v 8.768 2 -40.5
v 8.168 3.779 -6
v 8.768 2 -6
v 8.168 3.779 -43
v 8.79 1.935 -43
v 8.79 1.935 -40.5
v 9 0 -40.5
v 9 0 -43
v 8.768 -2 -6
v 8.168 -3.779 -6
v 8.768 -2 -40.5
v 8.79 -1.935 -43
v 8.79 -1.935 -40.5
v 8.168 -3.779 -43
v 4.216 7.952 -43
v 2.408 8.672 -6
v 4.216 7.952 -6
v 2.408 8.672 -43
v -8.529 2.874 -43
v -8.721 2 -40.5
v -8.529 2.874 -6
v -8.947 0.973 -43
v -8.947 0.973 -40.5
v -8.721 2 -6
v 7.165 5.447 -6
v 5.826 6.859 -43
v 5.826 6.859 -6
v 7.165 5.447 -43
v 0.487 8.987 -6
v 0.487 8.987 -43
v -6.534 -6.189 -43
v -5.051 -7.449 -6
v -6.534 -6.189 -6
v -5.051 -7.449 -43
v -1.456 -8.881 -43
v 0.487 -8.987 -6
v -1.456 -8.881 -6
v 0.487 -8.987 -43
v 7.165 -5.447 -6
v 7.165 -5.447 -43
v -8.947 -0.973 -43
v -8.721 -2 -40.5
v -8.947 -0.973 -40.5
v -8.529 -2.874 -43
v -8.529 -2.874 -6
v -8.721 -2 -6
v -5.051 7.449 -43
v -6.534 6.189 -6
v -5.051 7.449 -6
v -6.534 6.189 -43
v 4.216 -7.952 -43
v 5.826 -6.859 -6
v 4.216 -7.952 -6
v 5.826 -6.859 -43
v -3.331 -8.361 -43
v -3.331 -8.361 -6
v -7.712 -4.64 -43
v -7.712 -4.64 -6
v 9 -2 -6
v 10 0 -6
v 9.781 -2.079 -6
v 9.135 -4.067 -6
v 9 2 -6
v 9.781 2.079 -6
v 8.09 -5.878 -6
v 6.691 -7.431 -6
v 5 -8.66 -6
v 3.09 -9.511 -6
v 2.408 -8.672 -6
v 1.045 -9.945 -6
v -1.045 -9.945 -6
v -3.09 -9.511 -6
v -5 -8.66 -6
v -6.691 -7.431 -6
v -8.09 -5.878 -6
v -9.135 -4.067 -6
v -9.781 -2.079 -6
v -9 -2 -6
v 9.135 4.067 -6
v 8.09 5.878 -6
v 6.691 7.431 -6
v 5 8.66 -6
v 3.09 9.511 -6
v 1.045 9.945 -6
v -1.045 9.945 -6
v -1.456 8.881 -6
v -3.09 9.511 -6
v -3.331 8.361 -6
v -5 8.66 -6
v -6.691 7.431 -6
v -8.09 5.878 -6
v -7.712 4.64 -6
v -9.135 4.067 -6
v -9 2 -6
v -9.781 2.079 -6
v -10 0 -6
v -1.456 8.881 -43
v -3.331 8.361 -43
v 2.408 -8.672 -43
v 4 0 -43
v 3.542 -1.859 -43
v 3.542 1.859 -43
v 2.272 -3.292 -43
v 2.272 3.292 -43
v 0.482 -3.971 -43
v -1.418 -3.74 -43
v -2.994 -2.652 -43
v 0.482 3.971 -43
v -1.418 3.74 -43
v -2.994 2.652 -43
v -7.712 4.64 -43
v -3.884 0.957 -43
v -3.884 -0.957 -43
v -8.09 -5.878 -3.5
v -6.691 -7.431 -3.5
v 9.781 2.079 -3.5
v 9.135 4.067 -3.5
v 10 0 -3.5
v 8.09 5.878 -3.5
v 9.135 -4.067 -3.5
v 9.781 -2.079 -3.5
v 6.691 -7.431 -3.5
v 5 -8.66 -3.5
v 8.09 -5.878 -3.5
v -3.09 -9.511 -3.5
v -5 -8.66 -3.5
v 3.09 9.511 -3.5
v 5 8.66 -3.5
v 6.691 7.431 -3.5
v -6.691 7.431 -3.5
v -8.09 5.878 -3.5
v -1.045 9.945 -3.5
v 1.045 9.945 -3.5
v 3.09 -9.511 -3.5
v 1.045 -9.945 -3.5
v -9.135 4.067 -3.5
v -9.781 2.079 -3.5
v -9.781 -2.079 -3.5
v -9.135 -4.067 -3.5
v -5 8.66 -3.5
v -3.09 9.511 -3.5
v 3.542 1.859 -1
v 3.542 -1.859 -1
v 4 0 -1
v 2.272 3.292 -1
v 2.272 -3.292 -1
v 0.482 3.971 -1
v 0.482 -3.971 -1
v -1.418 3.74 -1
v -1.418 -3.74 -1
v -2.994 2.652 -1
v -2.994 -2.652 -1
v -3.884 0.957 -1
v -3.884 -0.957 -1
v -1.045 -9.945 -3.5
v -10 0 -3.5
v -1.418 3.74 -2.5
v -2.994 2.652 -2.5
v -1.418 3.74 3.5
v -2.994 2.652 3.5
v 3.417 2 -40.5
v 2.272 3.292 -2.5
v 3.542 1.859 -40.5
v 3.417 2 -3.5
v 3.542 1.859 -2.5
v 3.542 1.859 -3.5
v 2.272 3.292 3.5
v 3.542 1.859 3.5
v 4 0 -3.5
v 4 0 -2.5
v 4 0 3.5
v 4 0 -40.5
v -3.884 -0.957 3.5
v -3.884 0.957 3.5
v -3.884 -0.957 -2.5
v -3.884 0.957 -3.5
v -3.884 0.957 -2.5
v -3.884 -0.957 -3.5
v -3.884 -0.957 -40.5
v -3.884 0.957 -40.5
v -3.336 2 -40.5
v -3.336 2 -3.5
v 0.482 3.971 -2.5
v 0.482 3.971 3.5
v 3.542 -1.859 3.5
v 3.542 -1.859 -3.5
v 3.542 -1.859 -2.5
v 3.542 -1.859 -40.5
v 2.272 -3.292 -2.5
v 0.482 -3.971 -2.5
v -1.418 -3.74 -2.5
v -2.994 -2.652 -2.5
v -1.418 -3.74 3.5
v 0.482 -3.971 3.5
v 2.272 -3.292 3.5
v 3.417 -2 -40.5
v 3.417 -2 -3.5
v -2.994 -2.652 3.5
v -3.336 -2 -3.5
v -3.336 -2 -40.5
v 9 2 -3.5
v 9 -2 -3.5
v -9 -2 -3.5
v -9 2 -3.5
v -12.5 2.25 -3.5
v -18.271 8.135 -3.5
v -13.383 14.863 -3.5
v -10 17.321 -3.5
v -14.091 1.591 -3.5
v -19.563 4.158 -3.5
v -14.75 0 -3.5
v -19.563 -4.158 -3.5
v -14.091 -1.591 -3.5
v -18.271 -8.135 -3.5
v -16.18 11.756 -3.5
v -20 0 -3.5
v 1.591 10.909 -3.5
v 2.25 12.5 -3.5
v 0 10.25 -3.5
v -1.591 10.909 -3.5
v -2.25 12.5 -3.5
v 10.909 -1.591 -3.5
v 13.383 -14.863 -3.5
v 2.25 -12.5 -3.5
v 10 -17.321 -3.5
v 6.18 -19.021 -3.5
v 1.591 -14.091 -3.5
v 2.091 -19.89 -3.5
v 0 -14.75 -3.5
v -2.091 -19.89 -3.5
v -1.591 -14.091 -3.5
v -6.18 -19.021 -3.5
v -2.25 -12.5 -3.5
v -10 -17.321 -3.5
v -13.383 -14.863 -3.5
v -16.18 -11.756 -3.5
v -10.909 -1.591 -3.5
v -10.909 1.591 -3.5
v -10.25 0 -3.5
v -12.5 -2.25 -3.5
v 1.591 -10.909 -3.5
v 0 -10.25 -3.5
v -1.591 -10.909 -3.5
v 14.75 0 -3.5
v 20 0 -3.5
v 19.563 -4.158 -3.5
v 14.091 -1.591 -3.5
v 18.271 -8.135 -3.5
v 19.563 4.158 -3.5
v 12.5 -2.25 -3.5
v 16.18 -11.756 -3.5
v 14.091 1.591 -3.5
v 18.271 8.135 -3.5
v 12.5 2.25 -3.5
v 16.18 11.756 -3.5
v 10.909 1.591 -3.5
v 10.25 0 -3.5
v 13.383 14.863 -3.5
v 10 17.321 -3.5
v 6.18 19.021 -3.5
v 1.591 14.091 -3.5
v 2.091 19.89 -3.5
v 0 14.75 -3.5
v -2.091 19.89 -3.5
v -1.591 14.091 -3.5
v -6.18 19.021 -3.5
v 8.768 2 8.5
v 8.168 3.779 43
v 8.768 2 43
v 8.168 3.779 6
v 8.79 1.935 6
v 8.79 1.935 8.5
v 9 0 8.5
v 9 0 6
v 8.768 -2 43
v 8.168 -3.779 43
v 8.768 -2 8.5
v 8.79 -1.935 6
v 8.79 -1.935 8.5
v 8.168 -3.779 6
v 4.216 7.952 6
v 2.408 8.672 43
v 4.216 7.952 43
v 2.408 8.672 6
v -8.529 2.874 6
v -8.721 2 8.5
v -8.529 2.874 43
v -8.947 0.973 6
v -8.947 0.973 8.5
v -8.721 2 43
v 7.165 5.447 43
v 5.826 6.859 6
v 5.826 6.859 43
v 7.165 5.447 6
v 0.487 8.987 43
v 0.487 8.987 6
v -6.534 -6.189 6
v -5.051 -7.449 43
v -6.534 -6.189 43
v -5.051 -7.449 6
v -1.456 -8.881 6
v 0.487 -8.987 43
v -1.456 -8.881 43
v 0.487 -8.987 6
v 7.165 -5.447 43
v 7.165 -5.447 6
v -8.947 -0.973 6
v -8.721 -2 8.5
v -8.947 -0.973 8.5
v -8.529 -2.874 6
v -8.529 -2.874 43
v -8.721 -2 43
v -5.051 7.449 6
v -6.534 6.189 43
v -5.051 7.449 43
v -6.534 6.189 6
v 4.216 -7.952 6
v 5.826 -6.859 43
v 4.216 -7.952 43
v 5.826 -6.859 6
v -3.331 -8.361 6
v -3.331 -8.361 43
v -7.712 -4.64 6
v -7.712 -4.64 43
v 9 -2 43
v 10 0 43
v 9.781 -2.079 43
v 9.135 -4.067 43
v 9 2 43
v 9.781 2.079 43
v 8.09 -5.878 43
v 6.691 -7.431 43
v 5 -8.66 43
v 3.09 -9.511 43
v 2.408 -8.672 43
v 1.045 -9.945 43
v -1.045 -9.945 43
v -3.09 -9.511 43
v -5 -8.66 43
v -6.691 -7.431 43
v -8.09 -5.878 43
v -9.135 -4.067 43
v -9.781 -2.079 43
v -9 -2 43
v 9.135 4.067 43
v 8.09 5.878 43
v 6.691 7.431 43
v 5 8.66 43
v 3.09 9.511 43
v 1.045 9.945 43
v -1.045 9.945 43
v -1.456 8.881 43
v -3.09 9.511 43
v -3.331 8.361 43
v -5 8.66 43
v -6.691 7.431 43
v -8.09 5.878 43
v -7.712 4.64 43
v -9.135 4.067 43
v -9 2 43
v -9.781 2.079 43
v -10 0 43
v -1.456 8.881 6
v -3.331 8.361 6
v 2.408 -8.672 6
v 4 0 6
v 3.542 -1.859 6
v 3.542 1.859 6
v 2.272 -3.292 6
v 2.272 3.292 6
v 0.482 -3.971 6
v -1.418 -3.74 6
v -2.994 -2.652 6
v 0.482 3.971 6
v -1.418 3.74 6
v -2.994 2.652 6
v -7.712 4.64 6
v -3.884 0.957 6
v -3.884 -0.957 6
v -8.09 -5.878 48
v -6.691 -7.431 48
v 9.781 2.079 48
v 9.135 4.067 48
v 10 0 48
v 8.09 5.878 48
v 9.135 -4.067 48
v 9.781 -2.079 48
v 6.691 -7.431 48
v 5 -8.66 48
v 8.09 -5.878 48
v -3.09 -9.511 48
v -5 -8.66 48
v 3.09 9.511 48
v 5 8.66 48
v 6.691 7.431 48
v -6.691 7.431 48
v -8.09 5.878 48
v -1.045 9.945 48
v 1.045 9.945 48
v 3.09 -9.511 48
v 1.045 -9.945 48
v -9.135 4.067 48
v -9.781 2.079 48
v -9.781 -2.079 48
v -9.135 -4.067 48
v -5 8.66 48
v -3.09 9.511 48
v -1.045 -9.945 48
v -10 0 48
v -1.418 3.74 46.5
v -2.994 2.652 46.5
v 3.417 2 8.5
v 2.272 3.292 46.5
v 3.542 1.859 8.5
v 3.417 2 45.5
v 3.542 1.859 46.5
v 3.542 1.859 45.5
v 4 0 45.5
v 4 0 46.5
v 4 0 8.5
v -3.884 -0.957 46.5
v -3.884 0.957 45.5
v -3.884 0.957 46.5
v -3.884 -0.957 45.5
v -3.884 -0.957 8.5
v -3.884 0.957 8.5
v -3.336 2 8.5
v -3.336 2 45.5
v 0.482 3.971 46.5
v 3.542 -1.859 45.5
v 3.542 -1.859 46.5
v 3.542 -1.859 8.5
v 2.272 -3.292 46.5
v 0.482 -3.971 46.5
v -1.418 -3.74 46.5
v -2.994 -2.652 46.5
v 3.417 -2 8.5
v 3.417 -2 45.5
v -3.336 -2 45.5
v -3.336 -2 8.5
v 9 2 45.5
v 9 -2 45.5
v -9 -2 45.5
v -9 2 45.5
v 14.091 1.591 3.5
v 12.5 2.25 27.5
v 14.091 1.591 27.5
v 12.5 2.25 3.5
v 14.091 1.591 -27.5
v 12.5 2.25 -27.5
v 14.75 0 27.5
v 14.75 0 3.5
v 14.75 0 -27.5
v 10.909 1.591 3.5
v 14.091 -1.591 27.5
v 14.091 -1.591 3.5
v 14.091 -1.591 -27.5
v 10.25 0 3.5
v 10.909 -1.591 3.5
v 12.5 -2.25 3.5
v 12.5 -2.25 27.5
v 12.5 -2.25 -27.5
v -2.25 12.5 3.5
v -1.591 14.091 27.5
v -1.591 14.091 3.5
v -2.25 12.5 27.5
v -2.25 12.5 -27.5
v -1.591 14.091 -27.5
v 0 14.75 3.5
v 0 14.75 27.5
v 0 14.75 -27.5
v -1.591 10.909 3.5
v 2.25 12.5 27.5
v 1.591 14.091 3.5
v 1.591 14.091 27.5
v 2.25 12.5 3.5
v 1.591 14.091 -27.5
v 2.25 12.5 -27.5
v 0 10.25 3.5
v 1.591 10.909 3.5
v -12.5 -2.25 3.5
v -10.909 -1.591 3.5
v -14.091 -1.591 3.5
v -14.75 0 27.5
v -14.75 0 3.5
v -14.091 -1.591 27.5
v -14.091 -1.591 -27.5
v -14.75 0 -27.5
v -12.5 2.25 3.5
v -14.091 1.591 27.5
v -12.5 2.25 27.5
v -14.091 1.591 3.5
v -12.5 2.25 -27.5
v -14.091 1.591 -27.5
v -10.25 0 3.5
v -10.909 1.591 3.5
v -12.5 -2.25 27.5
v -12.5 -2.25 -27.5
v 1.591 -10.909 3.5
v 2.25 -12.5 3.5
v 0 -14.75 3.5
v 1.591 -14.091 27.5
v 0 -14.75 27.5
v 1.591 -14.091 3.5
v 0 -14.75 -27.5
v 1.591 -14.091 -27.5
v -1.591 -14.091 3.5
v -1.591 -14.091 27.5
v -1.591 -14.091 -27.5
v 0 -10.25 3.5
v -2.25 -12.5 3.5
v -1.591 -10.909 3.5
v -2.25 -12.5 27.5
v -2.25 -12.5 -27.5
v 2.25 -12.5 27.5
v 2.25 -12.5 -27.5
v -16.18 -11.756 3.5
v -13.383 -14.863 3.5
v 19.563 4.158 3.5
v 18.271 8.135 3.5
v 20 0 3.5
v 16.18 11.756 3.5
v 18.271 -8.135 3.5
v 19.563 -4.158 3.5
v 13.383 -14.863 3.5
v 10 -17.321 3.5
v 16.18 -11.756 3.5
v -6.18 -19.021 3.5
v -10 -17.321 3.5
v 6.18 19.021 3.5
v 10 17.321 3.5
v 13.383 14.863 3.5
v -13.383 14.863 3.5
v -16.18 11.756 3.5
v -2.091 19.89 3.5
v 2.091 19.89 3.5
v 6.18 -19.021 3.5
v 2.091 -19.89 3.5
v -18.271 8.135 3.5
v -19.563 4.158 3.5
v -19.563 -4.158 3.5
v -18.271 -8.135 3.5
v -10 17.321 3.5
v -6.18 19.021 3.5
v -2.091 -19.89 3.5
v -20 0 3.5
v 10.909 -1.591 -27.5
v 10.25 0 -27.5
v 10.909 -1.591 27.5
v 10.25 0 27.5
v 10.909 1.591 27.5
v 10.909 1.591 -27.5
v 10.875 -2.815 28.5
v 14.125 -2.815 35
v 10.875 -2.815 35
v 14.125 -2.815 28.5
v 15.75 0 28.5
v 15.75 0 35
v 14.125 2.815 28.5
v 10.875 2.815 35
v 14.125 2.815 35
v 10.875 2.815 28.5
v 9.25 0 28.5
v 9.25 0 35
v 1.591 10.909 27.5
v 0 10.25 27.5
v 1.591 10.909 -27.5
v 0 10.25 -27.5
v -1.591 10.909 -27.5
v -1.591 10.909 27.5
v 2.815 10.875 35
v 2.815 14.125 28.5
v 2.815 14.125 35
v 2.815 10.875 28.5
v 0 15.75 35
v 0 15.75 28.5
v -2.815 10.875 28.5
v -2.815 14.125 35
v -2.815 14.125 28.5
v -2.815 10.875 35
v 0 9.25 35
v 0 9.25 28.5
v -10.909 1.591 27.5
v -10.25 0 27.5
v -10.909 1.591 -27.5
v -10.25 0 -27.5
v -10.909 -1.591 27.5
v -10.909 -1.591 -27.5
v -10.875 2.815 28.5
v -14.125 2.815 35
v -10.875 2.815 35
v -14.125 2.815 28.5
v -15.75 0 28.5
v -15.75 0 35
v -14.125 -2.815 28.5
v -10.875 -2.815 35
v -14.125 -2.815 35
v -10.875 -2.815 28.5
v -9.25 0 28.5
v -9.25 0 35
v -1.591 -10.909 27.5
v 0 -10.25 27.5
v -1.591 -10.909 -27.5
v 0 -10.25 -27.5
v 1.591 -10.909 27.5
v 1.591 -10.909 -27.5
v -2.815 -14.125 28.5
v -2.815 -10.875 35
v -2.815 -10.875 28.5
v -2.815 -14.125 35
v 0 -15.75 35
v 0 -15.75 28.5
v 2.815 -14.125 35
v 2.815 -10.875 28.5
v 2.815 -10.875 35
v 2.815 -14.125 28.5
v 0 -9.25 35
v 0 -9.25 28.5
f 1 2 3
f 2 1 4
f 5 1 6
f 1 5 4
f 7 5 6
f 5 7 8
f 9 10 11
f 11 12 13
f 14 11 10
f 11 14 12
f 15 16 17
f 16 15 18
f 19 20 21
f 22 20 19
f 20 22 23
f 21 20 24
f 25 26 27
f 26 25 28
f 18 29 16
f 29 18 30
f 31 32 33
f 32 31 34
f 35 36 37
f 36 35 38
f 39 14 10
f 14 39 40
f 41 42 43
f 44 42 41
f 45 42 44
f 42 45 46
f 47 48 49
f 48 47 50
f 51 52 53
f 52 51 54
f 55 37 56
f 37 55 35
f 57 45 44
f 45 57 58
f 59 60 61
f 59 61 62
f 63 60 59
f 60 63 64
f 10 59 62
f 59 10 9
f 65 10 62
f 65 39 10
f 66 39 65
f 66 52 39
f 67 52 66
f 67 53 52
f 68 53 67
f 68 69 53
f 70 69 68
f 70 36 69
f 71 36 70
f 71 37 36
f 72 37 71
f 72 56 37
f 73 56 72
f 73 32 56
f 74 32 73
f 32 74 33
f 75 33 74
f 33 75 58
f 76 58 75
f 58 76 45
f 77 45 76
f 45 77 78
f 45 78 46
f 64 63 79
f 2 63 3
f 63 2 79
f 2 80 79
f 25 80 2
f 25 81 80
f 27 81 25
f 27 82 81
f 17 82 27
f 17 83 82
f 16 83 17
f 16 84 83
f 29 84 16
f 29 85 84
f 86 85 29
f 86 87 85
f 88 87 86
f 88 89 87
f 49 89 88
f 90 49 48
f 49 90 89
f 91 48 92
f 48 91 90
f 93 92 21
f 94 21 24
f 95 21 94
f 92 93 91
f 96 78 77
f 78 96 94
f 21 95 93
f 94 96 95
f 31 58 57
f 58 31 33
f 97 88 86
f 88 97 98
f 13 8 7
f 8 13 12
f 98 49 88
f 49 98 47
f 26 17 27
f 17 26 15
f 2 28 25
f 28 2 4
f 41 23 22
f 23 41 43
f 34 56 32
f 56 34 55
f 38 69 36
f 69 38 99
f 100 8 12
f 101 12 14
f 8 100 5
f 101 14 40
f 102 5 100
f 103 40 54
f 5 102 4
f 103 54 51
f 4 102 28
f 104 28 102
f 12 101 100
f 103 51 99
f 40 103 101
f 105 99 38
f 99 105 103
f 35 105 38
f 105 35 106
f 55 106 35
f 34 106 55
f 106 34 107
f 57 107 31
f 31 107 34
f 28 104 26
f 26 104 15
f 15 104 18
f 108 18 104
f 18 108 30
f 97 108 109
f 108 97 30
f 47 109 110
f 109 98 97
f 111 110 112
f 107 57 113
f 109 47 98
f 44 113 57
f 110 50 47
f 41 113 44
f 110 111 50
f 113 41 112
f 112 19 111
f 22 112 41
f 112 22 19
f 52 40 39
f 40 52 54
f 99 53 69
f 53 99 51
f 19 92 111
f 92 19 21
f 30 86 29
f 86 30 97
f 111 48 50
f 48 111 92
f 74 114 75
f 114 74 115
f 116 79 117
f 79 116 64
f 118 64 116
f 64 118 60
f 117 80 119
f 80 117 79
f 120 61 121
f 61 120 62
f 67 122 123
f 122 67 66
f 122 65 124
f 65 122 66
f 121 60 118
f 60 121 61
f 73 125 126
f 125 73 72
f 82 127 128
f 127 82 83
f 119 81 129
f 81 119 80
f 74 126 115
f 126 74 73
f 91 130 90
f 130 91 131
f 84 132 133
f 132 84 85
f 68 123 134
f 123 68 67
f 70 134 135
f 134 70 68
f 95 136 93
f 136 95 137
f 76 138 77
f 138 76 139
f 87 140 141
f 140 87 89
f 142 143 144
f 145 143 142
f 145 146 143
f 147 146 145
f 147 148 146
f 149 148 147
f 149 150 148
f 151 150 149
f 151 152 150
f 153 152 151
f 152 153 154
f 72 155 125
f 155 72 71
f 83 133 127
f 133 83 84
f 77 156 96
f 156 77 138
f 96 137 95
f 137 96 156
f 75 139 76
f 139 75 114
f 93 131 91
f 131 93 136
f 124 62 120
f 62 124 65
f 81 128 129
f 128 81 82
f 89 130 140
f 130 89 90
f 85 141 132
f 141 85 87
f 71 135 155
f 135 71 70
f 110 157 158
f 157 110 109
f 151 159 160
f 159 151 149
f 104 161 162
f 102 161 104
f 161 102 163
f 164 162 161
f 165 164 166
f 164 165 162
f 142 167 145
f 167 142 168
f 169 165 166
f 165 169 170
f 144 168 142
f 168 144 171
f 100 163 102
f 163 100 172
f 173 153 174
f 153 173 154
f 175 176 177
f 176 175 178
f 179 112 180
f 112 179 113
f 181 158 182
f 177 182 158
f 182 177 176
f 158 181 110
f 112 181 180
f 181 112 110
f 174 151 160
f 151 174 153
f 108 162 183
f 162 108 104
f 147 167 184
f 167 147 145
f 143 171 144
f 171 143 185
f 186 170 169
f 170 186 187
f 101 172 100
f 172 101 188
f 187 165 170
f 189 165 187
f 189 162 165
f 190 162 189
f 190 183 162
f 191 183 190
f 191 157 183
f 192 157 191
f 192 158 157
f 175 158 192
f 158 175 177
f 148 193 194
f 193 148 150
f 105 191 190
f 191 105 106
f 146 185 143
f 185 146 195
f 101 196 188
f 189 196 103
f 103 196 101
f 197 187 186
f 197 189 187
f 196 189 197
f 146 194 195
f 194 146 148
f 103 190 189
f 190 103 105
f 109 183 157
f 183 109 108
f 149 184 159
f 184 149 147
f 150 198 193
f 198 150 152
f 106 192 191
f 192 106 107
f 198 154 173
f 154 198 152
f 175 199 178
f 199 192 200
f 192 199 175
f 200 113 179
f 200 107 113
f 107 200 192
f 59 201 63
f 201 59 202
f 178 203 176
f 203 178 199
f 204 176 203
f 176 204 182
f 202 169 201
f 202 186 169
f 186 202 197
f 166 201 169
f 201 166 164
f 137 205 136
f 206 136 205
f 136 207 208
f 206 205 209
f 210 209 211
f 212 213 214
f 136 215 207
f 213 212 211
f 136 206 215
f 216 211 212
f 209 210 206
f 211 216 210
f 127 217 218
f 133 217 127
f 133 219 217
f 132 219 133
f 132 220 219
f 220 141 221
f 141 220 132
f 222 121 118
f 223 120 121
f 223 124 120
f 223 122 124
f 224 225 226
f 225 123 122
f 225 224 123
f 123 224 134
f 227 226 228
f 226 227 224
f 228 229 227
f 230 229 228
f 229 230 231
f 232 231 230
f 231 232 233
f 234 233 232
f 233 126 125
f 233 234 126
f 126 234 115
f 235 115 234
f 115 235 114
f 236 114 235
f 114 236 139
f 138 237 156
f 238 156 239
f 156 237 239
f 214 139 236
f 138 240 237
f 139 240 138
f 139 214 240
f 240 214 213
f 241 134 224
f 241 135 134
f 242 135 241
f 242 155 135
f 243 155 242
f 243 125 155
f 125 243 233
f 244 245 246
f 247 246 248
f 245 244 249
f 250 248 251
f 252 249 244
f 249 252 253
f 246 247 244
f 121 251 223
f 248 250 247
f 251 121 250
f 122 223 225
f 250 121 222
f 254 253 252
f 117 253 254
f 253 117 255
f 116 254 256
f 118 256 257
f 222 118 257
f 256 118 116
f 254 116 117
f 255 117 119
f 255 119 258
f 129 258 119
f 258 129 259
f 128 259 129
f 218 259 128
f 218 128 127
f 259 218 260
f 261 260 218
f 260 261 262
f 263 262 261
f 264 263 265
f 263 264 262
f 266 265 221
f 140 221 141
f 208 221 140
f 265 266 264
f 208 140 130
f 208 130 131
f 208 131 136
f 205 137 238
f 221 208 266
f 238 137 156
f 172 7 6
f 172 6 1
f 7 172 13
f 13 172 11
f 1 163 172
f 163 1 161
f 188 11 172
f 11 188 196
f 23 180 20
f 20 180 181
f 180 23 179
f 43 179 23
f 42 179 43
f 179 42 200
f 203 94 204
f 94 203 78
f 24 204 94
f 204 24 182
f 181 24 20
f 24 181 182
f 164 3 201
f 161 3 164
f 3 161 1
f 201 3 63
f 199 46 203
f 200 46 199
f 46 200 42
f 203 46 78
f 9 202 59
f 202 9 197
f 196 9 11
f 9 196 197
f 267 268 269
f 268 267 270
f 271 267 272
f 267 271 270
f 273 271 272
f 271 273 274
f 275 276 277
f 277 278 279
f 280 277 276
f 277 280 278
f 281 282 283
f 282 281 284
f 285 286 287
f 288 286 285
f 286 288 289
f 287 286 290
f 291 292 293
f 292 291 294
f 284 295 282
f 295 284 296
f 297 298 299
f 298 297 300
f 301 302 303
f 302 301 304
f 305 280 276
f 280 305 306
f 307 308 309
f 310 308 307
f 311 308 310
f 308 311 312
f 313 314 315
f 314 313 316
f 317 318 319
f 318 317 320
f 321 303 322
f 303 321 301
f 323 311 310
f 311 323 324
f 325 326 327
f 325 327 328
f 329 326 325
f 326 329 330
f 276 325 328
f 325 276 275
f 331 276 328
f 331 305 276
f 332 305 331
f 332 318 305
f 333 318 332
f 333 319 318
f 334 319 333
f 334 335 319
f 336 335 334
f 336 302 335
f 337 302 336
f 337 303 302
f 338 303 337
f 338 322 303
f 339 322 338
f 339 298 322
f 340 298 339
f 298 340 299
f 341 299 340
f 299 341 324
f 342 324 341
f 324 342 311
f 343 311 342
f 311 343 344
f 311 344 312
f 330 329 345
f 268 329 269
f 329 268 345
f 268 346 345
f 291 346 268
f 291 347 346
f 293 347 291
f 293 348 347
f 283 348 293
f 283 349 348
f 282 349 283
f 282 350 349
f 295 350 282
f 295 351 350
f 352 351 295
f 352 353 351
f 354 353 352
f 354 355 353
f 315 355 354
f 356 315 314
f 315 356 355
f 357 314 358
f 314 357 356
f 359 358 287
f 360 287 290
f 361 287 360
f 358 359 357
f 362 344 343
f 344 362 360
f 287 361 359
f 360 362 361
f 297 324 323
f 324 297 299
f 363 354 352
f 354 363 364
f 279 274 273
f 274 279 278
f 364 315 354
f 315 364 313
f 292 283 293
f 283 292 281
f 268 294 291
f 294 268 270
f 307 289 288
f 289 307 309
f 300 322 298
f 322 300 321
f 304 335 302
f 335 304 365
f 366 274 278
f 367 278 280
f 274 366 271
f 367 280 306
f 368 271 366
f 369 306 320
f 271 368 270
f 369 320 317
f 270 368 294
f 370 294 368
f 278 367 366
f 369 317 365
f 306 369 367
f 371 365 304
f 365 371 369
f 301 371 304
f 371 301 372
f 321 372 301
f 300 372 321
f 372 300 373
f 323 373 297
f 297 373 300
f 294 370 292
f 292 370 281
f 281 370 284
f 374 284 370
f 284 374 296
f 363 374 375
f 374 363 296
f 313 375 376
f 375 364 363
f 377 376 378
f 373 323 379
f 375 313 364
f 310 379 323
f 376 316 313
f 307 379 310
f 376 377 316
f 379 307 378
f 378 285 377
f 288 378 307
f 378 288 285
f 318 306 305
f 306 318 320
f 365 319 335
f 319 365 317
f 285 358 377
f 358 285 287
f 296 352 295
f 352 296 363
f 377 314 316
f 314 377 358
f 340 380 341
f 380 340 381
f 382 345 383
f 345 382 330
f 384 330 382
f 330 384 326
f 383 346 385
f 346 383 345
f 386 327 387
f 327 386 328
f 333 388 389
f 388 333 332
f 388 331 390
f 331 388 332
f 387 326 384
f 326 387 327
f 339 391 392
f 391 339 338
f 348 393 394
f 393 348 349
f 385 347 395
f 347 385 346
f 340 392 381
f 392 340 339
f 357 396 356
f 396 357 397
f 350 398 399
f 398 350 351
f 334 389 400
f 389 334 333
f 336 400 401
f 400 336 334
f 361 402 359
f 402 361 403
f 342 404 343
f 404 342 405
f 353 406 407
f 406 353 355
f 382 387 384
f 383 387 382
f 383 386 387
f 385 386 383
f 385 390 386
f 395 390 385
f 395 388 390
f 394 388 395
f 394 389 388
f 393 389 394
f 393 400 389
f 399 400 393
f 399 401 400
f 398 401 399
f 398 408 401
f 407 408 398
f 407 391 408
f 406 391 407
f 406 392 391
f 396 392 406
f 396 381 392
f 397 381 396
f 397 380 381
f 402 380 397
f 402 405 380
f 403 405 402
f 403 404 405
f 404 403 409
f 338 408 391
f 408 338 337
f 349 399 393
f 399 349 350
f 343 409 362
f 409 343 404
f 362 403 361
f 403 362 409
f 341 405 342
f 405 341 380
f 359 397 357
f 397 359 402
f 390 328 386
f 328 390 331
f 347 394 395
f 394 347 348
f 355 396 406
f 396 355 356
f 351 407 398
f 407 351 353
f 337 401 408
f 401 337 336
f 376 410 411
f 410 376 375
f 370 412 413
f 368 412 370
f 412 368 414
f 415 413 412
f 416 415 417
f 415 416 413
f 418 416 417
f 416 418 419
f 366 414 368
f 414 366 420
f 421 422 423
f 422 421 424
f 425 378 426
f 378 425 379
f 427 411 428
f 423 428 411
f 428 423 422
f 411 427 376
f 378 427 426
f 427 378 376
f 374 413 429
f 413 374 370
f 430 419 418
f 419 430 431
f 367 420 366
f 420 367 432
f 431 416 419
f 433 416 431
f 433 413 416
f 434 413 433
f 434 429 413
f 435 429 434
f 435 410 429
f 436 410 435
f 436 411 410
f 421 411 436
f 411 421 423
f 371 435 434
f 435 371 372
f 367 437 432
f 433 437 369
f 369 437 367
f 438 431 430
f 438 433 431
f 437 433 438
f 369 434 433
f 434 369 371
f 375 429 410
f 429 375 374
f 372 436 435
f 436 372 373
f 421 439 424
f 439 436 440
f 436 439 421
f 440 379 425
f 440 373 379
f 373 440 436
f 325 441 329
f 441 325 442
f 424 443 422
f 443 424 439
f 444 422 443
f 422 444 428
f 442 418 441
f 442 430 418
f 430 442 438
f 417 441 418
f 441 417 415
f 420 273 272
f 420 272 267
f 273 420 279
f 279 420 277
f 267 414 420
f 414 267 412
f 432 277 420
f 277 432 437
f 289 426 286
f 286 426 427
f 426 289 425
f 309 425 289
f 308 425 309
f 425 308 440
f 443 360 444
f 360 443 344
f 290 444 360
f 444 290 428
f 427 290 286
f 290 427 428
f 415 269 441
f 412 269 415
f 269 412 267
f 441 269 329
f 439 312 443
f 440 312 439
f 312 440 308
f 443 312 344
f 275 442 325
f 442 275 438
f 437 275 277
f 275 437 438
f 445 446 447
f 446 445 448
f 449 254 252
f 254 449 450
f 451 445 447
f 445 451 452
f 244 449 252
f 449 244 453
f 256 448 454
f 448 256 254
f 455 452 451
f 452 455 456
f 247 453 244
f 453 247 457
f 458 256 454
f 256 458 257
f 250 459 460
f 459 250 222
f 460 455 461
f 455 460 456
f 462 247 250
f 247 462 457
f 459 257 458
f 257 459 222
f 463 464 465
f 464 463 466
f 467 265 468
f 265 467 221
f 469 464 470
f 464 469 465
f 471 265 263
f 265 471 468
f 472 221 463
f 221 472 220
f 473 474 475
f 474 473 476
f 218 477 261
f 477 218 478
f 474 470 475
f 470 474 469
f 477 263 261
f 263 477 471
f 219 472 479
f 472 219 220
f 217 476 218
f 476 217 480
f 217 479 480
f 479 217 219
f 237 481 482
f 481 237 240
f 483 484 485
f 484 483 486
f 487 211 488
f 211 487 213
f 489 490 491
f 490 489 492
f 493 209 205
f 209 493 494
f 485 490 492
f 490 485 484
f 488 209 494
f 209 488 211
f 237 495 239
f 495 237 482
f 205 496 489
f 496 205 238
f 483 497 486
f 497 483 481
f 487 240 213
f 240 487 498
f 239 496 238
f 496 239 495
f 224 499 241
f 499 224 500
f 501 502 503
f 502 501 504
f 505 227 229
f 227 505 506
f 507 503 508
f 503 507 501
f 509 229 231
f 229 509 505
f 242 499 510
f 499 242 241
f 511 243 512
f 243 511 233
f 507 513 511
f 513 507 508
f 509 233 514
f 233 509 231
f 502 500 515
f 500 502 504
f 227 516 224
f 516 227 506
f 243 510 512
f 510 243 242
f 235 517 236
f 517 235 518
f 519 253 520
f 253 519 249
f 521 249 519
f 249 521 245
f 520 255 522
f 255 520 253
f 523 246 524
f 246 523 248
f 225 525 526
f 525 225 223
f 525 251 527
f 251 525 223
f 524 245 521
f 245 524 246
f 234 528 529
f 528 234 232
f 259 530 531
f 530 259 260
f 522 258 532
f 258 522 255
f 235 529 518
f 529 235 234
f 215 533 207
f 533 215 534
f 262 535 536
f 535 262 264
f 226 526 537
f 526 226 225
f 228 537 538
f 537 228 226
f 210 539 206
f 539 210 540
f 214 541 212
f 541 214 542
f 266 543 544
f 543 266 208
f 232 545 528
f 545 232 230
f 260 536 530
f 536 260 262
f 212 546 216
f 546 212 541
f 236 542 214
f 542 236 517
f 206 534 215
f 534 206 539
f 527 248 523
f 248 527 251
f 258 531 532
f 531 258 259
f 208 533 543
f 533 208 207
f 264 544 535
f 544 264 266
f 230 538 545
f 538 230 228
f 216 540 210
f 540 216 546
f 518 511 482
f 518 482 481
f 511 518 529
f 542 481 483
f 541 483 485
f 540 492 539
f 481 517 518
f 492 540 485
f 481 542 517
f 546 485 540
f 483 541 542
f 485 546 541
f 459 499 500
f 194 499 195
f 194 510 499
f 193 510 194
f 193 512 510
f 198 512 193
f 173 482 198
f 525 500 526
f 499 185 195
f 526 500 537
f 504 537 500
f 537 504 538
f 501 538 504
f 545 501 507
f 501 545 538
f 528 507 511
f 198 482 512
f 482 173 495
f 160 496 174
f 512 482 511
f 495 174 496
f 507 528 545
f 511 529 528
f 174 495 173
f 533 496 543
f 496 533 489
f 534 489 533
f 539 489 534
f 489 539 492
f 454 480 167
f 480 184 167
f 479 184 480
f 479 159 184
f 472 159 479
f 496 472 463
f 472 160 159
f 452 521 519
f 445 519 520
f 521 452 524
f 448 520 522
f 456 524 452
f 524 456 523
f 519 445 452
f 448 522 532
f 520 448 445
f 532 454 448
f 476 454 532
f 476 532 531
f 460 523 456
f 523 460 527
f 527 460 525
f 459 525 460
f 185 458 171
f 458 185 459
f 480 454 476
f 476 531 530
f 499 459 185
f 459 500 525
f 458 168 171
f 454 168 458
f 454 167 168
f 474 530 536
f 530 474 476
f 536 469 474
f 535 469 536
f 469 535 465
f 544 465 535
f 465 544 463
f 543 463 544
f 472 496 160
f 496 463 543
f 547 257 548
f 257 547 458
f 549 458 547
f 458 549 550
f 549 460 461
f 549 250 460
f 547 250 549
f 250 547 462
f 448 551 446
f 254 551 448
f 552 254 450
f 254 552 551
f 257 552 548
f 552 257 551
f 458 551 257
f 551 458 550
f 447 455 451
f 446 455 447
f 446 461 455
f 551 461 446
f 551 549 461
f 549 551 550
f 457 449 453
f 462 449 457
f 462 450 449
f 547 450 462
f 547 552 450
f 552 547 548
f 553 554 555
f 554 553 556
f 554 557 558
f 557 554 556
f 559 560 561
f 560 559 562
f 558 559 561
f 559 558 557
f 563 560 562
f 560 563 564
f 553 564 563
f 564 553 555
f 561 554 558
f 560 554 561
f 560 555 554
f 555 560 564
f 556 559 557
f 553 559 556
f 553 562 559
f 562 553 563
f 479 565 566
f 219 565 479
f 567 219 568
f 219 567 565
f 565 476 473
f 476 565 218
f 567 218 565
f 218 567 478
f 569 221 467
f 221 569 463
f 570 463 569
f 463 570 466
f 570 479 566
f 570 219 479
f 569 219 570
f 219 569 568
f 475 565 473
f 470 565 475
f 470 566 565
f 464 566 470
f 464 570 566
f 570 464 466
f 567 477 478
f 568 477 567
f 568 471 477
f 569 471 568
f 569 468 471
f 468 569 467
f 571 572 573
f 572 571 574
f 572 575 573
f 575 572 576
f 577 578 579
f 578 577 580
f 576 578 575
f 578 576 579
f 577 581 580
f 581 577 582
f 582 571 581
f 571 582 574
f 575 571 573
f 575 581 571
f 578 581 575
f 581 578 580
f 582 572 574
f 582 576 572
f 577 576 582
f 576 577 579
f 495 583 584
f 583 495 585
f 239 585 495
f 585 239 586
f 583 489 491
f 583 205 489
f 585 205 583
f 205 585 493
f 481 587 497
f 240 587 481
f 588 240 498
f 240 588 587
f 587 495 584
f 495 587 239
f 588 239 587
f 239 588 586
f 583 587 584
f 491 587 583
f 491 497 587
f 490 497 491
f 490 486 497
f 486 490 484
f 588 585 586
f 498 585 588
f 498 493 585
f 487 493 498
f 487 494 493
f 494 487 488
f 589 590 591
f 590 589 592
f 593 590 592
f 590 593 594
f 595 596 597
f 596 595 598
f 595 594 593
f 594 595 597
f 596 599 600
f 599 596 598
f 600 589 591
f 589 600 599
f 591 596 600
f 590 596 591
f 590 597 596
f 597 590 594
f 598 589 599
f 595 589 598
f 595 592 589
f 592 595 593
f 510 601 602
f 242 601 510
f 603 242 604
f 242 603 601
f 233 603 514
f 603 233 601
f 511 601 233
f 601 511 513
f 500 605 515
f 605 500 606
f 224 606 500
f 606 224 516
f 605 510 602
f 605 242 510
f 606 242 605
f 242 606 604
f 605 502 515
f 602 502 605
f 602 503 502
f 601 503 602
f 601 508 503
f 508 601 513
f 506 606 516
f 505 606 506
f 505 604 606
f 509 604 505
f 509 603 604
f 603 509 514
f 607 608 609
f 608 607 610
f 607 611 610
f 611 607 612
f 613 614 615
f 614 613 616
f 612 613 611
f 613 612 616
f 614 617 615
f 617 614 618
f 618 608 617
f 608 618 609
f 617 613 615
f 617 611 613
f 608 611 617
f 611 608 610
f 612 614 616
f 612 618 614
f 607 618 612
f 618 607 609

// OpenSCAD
//start

// Parameters
shaft_length = 42; 
shaft_diameter = 18; 
shaft_hole_diameter = 8;
shaft_mounting_diameter = 20; // Adjusted diameter for mounting surface
flange_diameter = 40;
flange_thickness = 3.5; // Reduced thickness for better match
diaphragm_thickness = 2;
bolt_diameter = 4.5; 
bolt_length = 55; // Increased bolt length for better match
nut_size = 6.5; // Reduced nut size for better match
bolt_spacing = 25;

// Function to create a shaft with keyway slots
module shaft() {
    difference() {
        union() {
            cylinder(h=shaft_length - 5, d=shaft_diameter, center=true);
            translate([0, 0, (shaft_length - 5) / 2])
                cylinder(h=5, d=shaft_mounting_diameter, center=false); // Adjusted mounting surface
        }
        cylinder(h=shaft_length+2, d=shaft_hole_diameter, center=true);
        
        // Adjusted keyway slots positioning
        translate([-shaft_diameter/2, -2, -shaft_length/2 + 5])
        cube([shaft_diameter, 4, shaft_length - 5]);
    }
}

// Function to create a flange plate
module flange_plate() {
    difference() {
        cylinder(h=flange_thickness, d=flange_diameter, center=true);
        cylinder(h=flange_thickness+2, d=shaft_hole_diameter, center=true);
        for (i = [0:3]) {
            rotate([0, 0, i * 90])
                translate([bolt_spacing/2, 0, 0])
                cylinder(h=flange_thickness+2, d=bolt_diameter, center=true);
        }
    }
}

// Function to create the diaphragm
module diaphragm() {
    difference() {
        translate([0, 0, -diaphragm_thickness/2])
        cylinder(h=diaphragm_thickness, d=flange_diameter, center=true);
        cylinder(h=diaphragm_thickness+2, d=shaft_hole_diameter, center=true);
        for (i = [0:3]) {
            rotate([0, 0, i * 90])
                translate([bolt_spacing/2, 0, 0])
                cylinder(h=diaphragm_thickness+2, d=bolt_diameter, center=true);
        }
    }
}

// Function to create a bolt
module bolt() {
    translate([0, 0, -bolt_length/2])
    cylinder(h=bolt_length, d=bolt_diameter, center=false);
}

// Function to create a nut
module nut() {
    cylinder(h=nut_size, d=nut_size, $fn=6);
}

// Assembly of the coupling
module coupling() {
    // Left Shaft
    translate([0, 0, -shaft_length/2 - flange_thickness])
    shaft();
    
    // Right Shaft
    translate([0, 0, shaft_length/2 + flange_thickness])
    shaft();
    
    // Left Flange Plate
    translate([0, 0, -flange_thickness/2])
    flange_plate();
    
    // Right Flange Plate
    translate([0, 0, flange_thickness/2])
    flange_plate();
    
    // Diaphragm - Adjusted for better alignment
    translate([0, 0, 0])
    diaphragm();
    
    // Bolts and Nuts - Adjusted positioning
    for (i = [0:3]) {
        rotate([0, 0, i * 90])
            translate([bolt_spacing/2, 0, 0]) {
                bolt();
                translate([0, 0, bolt_length/2 + 1]) // Adjusted nut position
                nut();
            }
    }
}

// Render the coupling
coupling();
